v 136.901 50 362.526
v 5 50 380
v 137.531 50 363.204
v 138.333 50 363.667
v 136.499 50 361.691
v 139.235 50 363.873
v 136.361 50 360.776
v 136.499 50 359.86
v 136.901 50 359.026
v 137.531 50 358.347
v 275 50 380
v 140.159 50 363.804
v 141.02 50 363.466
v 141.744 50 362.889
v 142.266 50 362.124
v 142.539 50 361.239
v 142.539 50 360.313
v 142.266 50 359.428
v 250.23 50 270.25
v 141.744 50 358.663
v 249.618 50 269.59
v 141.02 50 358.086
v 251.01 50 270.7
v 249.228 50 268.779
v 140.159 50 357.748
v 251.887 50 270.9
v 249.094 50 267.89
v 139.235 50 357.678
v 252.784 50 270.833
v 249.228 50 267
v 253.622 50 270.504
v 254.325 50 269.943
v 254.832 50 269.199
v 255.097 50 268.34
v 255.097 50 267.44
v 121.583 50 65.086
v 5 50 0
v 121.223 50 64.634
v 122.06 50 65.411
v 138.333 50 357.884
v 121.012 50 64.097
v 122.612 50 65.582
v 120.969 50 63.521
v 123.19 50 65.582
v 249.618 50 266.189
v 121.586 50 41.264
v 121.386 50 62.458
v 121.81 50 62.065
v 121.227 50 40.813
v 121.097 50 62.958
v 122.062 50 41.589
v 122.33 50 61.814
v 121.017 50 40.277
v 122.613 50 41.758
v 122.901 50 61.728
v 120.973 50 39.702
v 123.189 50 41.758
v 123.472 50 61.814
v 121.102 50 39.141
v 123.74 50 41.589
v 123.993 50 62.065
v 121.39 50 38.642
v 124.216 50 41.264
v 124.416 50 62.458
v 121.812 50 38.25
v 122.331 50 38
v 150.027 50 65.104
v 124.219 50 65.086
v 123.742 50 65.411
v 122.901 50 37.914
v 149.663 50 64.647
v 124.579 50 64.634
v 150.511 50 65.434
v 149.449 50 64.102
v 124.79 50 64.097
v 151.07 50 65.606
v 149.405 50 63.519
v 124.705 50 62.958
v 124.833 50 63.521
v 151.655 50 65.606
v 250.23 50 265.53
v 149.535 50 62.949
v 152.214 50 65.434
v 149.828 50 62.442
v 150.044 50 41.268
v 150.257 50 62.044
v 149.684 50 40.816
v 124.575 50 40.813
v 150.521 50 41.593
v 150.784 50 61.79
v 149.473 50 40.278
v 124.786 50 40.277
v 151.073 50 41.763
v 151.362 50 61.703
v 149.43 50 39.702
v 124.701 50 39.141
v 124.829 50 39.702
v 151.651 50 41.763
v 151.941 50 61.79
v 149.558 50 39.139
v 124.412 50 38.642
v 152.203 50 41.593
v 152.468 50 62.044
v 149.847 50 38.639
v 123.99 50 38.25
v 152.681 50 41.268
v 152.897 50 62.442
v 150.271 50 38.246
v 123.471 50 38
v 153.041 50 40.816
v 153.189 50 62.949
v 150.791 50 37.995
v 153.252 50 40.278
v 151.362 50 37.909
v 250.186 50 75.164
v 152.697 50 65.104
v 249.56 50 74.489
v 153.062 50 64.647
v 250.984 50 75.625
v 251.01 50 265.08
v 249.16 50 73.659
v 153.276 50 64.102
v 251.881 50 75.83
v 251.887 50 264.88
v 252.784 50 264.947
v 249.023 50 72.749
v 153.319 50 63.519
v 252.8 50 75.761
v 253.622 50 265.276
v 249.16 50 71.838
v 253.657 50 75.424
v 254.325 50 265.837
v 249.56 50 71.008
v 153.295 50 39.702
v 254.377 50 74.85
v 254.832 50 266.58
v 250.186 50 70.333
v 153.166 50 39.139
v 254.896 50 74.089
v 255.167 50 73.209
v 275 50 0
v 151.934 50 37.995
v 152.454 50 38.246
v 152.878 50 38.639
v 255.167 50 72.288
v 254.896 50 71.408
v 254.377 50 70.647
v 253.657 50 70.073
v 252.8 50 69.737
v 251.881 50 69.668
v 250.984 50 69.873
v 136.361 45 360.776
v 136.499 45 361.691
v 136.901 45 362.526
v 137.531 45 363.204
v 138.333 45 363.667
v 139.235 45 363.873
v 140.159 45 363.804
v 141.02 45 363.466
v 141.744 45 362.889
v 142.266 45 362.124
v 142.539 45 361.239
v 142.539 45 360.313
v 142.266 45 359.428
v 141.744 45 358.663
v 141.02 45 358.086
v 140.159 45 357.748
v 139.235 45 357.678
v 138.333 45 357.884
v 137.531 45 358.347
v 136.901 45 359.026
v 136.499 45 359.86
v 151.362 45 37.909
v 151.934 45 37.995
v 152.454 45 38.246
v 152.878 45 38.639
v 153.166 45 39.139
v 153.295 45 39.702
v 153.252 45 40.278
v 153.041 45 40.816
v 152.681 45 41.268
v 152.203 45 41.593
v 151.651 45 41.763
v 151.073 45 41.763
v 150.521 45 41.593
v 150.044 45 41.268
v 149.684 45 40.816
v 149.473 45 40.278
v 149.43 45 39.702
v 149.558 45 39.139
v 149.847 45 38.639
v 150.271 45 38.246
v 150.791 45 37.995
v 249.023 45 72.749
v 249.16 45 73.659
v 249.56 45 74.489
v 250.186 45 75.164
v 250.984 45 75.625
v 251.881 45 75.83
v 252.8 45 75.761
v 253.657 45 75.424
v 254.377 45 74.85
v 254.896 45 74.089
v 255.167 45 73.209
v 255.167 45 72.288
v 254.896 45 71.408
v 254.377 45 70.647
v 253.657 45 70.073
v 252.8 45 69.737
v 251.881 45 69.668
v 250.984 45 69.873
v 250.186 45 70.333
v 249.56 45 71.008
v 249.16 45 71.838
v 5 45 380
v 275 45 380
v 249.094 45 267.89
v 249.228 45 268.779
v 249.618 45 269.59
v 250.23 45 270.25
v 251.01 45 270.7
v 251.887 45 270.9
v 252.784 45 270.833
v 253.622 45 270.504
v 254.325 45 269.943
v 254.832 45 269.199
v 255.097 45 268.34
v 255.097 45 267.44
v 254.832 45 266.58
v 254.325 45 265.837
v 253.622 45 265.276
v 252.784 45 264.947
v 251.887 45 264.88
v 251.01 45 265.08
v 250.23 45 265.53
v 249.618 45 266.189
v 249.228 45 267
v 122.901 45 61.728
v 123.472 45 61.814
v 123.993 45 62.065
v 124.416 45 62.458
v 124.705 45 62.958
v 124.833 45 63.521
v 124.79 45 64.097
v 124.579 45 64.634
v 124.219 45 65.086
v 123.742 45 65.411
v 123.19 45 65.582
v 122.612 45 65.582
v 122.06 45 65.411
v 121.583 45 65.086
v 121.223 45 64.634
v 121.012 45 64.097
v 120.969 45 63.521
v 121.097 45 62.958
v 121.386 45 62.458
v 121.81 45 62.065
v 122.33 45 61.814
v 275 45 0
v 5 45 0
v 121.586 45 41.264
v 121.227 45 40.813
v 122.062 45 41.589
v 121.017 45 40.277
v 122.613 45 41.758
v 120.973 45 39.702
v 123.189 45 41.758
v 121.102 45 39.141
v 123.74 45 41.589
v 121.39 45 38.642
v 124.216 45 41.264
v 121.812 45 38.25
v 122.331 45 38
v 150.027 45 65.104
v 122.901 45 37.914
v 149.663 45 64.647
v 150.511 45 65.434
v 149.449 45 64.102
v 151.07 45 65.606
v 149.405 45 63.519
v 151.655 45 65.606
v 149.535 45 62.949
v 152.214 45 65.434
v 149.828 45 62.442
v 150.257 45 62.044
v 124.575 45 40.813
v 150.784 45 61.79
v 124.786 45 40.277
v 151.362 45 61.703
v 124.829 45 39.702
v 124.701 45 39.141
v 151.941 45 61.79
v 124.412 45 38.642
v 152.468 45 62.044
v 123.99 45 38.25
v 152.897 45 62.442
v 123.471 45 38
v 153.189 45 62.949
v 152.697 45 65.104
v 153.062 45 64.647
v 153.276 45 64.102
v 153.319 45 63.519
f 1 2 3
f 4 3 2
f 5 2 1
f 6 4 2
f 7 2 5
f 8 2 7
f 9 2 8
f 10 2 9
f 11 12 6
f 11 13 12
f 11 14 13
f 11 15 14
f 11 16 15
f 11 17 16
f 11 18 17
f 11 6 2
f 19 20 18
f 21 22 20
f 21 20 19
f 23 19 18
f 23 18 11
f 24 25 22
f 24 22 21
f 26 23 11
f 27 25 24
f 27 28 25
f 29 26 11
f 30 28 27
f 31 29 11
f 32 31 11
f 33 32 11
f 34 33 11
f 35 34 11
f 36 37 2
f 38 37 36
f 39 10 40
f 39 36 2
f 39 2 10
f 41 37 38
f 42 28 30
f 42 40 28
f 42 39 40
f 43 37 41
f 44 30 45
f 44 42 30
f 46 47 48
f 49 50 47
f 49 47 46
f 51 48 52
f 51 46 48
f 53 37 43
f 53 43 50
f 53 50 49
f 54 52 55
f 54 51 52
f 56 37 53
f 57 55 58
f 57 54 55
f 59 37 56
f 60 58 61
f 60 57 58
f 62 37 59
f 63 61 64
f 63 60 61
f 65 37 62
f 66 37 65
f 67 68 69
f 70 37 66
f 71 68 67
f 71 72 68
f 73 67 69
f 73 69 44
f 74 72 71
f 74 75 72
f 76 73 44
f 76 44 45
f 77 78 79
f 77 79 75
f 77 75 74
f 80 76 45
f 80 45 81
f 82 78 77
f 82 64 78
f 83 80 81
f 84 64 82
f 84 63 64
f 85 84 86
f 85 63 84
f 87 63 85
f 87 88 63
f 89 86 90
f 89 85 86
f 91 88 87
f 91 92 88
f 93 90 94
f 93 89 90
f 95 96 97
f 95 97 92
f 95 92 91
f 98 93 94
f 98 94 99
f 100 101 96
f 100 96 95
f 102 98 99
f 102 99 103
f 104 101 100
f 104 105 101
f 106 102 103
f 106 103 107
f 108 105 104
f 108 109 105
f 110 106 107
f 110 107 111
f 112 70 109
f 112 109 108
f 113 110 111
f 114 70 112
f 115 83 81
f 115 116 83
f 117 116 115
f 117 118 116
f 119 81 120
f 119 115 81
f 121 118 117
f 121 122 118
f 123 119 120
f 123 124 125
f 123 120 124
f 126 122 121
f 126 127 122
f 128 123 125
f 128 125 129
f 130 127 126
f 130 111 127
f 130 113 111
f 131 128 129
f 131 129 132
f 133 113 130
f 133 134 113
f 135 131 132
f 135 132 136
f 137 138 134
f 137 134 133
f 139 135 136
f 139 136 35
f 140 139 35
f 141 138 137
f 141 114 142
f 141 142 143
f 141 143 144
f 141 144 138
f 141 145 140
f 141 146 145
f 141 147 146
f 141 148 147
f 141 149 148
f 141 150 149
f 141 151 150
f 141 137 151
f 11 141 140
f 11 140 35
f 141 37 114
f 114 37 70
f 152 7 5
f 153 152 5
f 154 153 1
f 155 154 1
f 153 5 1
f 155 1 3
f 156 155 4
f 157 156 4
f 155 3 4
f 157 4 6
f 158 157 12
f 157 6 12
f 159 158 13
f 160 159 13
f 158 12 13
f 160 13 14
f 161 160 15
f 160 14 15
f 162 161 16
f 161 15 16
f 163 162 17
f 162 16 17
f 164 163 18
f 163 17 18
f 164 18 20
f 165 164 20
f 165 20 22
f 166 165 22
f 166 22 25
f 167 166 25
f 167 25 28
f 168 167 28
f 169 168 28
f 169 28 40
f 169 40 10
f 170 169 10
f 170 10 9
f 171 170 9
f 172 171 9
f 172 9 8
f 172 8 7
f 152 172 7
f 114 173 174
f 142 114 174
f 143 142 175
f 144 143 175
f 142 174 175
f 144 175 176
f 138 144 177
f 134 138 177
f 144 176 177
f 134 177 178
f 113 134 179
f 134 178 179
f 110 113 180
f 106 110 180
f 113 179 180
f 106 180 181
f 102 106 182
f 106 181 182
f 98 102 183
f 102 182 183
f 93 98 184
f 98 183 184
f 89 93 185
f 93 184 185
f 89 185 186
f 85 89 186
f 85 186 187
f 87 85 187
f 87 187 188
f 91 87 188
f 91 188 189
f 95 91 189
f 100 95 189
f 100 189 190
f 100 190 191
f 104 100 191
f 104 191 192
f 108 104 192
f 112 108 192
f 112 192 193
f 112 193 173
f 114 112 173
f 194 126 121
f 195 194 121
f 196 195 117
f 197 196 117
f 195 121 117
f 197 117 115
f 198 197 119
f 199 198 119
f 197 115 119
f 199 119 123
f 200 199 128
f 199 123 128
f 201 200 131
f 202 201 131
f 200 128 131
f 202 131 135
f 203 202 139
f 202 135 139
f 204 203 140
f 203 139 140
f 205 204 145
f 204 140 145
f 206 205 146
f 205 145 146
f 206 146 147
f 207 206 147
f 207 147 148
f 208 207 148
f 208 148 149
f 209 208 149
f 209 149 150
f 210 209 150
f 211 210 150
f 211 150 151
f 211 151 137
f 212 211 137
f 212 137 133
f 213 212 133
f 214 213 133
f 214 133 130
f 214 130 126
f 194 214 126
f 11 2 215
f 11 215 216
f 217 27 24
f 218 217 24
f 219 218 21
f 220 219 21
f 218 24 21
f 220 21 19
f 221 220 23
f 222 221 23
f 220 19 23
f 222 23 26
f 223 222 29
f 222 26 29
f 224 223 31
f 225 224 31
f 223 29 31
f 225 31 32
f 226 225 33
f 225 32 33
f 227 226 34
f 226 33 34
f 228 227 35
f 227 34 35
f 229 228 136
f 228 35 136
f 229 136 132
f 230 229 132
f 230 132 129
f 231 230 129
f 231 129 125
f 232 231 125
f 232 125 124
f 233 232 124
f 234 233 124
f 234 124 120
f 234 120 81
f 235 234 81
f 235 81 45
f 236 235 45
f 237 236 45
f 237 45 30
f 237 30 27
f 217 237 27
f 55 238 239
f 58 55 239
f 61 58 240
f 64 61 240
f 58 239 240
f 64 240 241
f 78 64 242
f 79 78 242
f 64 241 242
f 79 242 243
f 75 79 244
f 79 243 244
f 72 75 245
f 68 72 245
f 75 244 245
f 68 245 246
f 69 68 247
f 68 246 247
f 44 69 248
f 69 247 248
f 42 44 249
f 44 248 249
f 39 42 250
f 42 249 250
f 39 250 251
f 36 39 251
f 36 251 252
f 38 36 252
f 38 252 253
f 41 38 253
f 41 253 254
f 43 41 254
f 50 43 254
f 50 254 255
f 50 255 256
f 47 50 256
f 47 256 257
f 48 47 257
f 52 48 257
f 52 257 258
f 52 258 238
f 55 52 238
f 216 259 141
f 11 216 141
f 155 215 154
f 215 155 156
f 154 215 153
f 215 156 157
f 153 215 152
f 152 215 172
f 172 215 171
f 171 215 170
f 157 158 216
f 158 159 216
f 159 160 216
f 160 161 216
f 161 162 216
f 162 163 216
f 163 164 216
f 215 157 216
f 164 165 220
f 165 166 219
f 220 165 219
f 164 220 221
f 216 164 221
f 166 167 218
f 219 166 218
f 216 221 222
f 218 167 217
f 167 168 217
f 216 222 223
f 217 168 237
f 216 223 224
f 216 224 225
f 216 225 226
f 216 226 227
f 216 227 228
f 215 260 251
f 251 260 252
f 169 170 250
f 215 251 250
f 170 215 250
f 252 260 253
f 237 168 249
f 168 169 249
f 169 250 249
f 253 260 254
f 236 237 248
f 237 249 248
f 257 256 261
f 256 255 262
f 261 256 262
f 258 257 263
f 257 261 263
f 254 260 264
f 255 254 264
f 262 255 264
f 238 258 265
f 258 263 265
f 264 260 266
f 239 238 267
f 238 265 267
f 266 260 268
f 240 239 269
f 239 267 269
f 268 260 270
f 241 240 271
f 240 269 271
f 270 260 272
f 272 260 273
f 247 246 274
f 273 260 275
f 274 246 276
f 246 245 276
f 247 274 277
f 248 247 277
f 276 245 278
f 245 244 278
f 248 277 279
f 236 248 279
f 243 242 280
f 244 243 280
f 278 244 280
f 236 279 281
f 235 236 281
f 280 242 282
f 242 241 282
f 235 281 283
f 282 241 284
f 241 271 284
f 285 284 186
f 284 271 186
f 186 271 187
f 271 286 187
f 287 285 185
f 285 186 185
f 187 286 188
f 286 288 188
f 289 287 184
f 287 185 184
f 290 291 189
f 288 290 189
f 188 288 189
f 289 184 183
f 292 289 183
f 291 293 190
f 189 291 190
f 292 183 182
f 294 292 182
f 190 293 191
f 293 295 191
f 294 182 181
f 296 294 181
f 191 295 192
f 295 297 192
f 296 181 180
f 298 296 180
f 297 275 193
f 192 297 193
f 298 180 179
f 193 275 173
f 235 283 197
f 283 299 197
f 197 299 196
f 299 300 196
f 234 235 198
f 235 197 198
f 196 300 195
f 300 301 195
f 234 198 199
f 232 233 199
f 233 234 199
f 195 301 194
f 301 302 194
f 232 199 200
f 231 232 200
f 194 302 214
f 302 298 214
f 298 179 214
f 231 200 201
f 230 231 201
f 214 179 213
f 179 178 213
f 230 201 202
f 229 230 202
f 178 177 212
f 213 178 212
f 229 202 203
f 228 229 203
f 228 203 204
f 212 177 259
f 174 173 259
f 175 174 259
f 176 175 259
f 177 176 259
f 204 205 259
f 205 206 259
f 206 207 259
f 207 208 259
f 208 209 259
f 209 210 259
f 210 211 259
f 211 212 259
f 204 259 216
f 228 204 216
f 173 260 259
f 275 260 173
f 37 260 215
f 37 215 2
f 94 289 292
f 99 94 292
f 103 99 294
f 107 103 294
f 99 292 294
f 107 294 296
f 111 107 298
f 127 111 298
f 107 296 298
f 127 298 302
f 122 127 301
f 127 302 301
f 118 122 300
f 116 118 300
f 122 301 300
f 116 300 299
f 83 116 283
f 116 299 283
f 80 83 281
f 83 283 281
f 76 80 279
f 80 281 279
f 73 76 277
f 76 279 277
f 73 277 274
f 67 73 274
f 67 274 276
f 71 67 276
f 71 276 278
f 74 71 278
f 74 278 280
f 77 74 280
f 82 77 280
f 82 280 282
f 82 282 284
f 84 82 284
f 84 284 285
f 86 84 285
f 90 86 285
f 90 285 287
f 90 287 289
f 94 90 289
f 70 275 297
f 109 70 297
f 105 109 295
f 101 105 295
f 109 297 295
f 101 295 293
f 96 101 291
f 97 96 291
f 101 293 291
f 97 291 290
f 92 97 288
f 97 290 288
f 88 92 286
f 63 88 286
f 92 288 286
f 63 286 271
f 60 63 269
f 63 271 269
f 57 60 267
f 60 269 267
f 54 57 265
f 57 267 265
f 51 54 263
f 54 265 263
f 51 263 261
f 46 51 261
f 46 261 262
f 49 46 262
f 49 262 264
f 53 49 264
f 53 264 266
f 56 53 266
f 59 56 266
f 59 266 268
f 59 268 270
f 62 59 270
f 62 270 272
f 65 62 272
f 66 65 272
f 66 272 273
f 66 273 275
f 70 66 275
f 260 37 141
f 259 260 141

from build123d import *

# Parameters (mm, degrees)
SKETCH1_W           = 270
SKETCH1_H           = 5
BOSS_EXTRUDE1_DEPTH = 380
CUT_EXTRUDE1_REACH  = 471.095
SKETCH6_R           = 1.93305462
SKETCH6_R_2         = 1.937574749
SKETCH6_R_3         = 1.938092279
SKETCH6_R_4         = 1.962476596
CUT_EXTRUDE2_REACH  = 471.095
SKETCH7_R           = 3.018542897
SKETCH7_R_2         = 3.089358341
SKETCH7_R_3         = 3.106196555


with BuildPart() as part:
    # Sketch1 → Boss-Extrude1 (new body)
    with BuildSketch(Plane.XY):
        with Locations((140, 47.5)):
            Rectangle(SKETCH1_W, SKETCH1_H)
    extrude(amount=BOSS_EXTRUDE1_DEPTH)

    # Sketch6 → Cut-Extrude1 (cut, up to next)
    with BuildSketch(Plane.XZ.offset(-45), mode=Mode.PRIVATE) as cut_extrude1_sk1:
        with Locations(Location((122.901099302, 39.846951351, 0), (0, 0, 270))):
            Circle(SKETCH6_R)
    cut_extrude1_tool1 = extrude(cut_extrude1_sk1.sketch, amount=-CUT_EXTRUDE1_REACH, mode=Mode.PRIVATE) & part.part
    # Sketch6 → Cut-Extrude1 (cut, up to next)
    with BuildSketch(Plane.XZ.offset(-45), mode=Mode.PRIVATE) as cut_extrude1_sk2:
        with Locations(Location((122.901099302, 63.66567027, 0), (0, 0, 270))):
            Circle(SKETCH6_R_2)
    cut_extrude1_tool2 = extrude(cut_extrude1_sk2.sketch, amount=-CUT_EXTRUDE1_REACH, mode=Mode.PRIVATE) & part.part
    # Sketch6 → Cut-Extrude1 (cut, up to next)
    with BuildSketch(Plane.XZ.offset(-45), mode=Mode.PRIVATE) as cut_extrude1_sk3:
        with Locations(Location((151.362300698, 39.846951351, 0), (0, 0, 270))):
            Circle(SKETCH6_R_3)
    cut_extrude1_tool3 = extrude(cut_extrude1_sk3.sketch, amount=-CUT_EXTRUDE1_REACH, mode=Mode.PRIVATE) & part.part
    # Sketch6 → Cut-Extrude1 (cut, up to next)
    with BuildSketch(Plane.XZ.offset(-45), mode=Mode.PRIVATE) as cut_extrude1_sk4:
        with Locations(Location((151.362300698, 63.66567027, 0), (0, 0, 270))):
            Circle(SKETCH6_R_4)
    cut_extrude1_tool4 = extrude(cut_extrude1_sk4.sketch, amount=-CUT_EXTRUDE1_REACH, mode=Mode.PRIVATE) & part.part
    add(cut_extrude1_tool1.solids().sort_by_distance((122.901099, 45, 39.846951))[0], mode=Mode.SUBTRACT)
    add(cut_extrude1_tool2.solids().sort_by_distance((122.901099, 45, 63.66567))[0], mode=Mode.SUBTRACT)
    add(cut_extrude1_tool3.solids().sort_by_distance((151.362301, 45, 39.846951))[0], mode=Mode.SUBTRACT)
    add(cut_extrude1_tool4.solids().sort_by_distance((151.362301, 45, 63.66567))[0], mode=Mode.SUBTRACT)

    # Sketch7 → Cut-Extrude2 (cut, up to next)
    with BuildSketch(Plane(origin=(0, 50, 0), x_dir=(1, 0, 0), z_dir=(0, 1, 0)), mode=Mode.PRIVATE) as cut_extrude2_sk1:
        with Locations(Location((252.112318831, -267.889689572, 0), (0, 0, 180))):
            Circle(SKETCH7_R)
    cut_extrude2_tool1 = extrude(cut_extrude2_sk1.sketch, amount=-CUT_EXTRUDE2_REACH, mode=Mode.PRIVATE) & part.part
    # Sketch7 → Cut-Extrude2 (cut, up to next)
    with BuildSketch(Plane(origin=(0, 50, 0), x_dir=(1, 0, 0), z_dir=(0, 1, 0)), mode=Mode.PRIVATE) as cut_extrude2_sk2:
        with Locations(Location((252.112318831, -72.748786013, 0), (0, 0, 180))):
            Circle(SKETCH7_R_2)
    cut_extrude2_tool2 = extrude(cut_extrude2_sk2.sketch, amount=-CUT_EXTRUDE2_REACH, mode=Mode.PRIVATE) & part.part
    # Sketch7 → Cut-Extrude2 (cut, up to next)
    with BuildSketch(Plane(origin=(0, 50, 0), x_dir=(1, 0, 0), z_dir=(0, 1, 0)), mode=Mode.PRIVATE) as cut_extrude2_sk3:
        with Locations(Location((139.467321486, -360.775883093, 0), (0, 0, 180))):
            Circle(SKETCH7_R_3)
    cut_extrude2_tool3 = extrude(cut_extrude2_sk3.sketch, amount=-CUT_EXTRUDE2_REACH, mode=Mode.PRIVATE) & part.part
    add(cut_extrude2_tool1.solids().sort_by_distance((252.112319, 50, 267.88969))[0], mode=Mode.SUBTRACT)
    add(cut_extrude2_tool2.solids().sort_by_distance((252.112319, 50, 72.748786))[0], mode=Mode.SUBTRACT)
    add(cut_extrude2_tool3.solids().sort_by_distance((139.467321, 50, 360.775883))[0], mode=Mode.SUBTRACT)


solid = part.part
